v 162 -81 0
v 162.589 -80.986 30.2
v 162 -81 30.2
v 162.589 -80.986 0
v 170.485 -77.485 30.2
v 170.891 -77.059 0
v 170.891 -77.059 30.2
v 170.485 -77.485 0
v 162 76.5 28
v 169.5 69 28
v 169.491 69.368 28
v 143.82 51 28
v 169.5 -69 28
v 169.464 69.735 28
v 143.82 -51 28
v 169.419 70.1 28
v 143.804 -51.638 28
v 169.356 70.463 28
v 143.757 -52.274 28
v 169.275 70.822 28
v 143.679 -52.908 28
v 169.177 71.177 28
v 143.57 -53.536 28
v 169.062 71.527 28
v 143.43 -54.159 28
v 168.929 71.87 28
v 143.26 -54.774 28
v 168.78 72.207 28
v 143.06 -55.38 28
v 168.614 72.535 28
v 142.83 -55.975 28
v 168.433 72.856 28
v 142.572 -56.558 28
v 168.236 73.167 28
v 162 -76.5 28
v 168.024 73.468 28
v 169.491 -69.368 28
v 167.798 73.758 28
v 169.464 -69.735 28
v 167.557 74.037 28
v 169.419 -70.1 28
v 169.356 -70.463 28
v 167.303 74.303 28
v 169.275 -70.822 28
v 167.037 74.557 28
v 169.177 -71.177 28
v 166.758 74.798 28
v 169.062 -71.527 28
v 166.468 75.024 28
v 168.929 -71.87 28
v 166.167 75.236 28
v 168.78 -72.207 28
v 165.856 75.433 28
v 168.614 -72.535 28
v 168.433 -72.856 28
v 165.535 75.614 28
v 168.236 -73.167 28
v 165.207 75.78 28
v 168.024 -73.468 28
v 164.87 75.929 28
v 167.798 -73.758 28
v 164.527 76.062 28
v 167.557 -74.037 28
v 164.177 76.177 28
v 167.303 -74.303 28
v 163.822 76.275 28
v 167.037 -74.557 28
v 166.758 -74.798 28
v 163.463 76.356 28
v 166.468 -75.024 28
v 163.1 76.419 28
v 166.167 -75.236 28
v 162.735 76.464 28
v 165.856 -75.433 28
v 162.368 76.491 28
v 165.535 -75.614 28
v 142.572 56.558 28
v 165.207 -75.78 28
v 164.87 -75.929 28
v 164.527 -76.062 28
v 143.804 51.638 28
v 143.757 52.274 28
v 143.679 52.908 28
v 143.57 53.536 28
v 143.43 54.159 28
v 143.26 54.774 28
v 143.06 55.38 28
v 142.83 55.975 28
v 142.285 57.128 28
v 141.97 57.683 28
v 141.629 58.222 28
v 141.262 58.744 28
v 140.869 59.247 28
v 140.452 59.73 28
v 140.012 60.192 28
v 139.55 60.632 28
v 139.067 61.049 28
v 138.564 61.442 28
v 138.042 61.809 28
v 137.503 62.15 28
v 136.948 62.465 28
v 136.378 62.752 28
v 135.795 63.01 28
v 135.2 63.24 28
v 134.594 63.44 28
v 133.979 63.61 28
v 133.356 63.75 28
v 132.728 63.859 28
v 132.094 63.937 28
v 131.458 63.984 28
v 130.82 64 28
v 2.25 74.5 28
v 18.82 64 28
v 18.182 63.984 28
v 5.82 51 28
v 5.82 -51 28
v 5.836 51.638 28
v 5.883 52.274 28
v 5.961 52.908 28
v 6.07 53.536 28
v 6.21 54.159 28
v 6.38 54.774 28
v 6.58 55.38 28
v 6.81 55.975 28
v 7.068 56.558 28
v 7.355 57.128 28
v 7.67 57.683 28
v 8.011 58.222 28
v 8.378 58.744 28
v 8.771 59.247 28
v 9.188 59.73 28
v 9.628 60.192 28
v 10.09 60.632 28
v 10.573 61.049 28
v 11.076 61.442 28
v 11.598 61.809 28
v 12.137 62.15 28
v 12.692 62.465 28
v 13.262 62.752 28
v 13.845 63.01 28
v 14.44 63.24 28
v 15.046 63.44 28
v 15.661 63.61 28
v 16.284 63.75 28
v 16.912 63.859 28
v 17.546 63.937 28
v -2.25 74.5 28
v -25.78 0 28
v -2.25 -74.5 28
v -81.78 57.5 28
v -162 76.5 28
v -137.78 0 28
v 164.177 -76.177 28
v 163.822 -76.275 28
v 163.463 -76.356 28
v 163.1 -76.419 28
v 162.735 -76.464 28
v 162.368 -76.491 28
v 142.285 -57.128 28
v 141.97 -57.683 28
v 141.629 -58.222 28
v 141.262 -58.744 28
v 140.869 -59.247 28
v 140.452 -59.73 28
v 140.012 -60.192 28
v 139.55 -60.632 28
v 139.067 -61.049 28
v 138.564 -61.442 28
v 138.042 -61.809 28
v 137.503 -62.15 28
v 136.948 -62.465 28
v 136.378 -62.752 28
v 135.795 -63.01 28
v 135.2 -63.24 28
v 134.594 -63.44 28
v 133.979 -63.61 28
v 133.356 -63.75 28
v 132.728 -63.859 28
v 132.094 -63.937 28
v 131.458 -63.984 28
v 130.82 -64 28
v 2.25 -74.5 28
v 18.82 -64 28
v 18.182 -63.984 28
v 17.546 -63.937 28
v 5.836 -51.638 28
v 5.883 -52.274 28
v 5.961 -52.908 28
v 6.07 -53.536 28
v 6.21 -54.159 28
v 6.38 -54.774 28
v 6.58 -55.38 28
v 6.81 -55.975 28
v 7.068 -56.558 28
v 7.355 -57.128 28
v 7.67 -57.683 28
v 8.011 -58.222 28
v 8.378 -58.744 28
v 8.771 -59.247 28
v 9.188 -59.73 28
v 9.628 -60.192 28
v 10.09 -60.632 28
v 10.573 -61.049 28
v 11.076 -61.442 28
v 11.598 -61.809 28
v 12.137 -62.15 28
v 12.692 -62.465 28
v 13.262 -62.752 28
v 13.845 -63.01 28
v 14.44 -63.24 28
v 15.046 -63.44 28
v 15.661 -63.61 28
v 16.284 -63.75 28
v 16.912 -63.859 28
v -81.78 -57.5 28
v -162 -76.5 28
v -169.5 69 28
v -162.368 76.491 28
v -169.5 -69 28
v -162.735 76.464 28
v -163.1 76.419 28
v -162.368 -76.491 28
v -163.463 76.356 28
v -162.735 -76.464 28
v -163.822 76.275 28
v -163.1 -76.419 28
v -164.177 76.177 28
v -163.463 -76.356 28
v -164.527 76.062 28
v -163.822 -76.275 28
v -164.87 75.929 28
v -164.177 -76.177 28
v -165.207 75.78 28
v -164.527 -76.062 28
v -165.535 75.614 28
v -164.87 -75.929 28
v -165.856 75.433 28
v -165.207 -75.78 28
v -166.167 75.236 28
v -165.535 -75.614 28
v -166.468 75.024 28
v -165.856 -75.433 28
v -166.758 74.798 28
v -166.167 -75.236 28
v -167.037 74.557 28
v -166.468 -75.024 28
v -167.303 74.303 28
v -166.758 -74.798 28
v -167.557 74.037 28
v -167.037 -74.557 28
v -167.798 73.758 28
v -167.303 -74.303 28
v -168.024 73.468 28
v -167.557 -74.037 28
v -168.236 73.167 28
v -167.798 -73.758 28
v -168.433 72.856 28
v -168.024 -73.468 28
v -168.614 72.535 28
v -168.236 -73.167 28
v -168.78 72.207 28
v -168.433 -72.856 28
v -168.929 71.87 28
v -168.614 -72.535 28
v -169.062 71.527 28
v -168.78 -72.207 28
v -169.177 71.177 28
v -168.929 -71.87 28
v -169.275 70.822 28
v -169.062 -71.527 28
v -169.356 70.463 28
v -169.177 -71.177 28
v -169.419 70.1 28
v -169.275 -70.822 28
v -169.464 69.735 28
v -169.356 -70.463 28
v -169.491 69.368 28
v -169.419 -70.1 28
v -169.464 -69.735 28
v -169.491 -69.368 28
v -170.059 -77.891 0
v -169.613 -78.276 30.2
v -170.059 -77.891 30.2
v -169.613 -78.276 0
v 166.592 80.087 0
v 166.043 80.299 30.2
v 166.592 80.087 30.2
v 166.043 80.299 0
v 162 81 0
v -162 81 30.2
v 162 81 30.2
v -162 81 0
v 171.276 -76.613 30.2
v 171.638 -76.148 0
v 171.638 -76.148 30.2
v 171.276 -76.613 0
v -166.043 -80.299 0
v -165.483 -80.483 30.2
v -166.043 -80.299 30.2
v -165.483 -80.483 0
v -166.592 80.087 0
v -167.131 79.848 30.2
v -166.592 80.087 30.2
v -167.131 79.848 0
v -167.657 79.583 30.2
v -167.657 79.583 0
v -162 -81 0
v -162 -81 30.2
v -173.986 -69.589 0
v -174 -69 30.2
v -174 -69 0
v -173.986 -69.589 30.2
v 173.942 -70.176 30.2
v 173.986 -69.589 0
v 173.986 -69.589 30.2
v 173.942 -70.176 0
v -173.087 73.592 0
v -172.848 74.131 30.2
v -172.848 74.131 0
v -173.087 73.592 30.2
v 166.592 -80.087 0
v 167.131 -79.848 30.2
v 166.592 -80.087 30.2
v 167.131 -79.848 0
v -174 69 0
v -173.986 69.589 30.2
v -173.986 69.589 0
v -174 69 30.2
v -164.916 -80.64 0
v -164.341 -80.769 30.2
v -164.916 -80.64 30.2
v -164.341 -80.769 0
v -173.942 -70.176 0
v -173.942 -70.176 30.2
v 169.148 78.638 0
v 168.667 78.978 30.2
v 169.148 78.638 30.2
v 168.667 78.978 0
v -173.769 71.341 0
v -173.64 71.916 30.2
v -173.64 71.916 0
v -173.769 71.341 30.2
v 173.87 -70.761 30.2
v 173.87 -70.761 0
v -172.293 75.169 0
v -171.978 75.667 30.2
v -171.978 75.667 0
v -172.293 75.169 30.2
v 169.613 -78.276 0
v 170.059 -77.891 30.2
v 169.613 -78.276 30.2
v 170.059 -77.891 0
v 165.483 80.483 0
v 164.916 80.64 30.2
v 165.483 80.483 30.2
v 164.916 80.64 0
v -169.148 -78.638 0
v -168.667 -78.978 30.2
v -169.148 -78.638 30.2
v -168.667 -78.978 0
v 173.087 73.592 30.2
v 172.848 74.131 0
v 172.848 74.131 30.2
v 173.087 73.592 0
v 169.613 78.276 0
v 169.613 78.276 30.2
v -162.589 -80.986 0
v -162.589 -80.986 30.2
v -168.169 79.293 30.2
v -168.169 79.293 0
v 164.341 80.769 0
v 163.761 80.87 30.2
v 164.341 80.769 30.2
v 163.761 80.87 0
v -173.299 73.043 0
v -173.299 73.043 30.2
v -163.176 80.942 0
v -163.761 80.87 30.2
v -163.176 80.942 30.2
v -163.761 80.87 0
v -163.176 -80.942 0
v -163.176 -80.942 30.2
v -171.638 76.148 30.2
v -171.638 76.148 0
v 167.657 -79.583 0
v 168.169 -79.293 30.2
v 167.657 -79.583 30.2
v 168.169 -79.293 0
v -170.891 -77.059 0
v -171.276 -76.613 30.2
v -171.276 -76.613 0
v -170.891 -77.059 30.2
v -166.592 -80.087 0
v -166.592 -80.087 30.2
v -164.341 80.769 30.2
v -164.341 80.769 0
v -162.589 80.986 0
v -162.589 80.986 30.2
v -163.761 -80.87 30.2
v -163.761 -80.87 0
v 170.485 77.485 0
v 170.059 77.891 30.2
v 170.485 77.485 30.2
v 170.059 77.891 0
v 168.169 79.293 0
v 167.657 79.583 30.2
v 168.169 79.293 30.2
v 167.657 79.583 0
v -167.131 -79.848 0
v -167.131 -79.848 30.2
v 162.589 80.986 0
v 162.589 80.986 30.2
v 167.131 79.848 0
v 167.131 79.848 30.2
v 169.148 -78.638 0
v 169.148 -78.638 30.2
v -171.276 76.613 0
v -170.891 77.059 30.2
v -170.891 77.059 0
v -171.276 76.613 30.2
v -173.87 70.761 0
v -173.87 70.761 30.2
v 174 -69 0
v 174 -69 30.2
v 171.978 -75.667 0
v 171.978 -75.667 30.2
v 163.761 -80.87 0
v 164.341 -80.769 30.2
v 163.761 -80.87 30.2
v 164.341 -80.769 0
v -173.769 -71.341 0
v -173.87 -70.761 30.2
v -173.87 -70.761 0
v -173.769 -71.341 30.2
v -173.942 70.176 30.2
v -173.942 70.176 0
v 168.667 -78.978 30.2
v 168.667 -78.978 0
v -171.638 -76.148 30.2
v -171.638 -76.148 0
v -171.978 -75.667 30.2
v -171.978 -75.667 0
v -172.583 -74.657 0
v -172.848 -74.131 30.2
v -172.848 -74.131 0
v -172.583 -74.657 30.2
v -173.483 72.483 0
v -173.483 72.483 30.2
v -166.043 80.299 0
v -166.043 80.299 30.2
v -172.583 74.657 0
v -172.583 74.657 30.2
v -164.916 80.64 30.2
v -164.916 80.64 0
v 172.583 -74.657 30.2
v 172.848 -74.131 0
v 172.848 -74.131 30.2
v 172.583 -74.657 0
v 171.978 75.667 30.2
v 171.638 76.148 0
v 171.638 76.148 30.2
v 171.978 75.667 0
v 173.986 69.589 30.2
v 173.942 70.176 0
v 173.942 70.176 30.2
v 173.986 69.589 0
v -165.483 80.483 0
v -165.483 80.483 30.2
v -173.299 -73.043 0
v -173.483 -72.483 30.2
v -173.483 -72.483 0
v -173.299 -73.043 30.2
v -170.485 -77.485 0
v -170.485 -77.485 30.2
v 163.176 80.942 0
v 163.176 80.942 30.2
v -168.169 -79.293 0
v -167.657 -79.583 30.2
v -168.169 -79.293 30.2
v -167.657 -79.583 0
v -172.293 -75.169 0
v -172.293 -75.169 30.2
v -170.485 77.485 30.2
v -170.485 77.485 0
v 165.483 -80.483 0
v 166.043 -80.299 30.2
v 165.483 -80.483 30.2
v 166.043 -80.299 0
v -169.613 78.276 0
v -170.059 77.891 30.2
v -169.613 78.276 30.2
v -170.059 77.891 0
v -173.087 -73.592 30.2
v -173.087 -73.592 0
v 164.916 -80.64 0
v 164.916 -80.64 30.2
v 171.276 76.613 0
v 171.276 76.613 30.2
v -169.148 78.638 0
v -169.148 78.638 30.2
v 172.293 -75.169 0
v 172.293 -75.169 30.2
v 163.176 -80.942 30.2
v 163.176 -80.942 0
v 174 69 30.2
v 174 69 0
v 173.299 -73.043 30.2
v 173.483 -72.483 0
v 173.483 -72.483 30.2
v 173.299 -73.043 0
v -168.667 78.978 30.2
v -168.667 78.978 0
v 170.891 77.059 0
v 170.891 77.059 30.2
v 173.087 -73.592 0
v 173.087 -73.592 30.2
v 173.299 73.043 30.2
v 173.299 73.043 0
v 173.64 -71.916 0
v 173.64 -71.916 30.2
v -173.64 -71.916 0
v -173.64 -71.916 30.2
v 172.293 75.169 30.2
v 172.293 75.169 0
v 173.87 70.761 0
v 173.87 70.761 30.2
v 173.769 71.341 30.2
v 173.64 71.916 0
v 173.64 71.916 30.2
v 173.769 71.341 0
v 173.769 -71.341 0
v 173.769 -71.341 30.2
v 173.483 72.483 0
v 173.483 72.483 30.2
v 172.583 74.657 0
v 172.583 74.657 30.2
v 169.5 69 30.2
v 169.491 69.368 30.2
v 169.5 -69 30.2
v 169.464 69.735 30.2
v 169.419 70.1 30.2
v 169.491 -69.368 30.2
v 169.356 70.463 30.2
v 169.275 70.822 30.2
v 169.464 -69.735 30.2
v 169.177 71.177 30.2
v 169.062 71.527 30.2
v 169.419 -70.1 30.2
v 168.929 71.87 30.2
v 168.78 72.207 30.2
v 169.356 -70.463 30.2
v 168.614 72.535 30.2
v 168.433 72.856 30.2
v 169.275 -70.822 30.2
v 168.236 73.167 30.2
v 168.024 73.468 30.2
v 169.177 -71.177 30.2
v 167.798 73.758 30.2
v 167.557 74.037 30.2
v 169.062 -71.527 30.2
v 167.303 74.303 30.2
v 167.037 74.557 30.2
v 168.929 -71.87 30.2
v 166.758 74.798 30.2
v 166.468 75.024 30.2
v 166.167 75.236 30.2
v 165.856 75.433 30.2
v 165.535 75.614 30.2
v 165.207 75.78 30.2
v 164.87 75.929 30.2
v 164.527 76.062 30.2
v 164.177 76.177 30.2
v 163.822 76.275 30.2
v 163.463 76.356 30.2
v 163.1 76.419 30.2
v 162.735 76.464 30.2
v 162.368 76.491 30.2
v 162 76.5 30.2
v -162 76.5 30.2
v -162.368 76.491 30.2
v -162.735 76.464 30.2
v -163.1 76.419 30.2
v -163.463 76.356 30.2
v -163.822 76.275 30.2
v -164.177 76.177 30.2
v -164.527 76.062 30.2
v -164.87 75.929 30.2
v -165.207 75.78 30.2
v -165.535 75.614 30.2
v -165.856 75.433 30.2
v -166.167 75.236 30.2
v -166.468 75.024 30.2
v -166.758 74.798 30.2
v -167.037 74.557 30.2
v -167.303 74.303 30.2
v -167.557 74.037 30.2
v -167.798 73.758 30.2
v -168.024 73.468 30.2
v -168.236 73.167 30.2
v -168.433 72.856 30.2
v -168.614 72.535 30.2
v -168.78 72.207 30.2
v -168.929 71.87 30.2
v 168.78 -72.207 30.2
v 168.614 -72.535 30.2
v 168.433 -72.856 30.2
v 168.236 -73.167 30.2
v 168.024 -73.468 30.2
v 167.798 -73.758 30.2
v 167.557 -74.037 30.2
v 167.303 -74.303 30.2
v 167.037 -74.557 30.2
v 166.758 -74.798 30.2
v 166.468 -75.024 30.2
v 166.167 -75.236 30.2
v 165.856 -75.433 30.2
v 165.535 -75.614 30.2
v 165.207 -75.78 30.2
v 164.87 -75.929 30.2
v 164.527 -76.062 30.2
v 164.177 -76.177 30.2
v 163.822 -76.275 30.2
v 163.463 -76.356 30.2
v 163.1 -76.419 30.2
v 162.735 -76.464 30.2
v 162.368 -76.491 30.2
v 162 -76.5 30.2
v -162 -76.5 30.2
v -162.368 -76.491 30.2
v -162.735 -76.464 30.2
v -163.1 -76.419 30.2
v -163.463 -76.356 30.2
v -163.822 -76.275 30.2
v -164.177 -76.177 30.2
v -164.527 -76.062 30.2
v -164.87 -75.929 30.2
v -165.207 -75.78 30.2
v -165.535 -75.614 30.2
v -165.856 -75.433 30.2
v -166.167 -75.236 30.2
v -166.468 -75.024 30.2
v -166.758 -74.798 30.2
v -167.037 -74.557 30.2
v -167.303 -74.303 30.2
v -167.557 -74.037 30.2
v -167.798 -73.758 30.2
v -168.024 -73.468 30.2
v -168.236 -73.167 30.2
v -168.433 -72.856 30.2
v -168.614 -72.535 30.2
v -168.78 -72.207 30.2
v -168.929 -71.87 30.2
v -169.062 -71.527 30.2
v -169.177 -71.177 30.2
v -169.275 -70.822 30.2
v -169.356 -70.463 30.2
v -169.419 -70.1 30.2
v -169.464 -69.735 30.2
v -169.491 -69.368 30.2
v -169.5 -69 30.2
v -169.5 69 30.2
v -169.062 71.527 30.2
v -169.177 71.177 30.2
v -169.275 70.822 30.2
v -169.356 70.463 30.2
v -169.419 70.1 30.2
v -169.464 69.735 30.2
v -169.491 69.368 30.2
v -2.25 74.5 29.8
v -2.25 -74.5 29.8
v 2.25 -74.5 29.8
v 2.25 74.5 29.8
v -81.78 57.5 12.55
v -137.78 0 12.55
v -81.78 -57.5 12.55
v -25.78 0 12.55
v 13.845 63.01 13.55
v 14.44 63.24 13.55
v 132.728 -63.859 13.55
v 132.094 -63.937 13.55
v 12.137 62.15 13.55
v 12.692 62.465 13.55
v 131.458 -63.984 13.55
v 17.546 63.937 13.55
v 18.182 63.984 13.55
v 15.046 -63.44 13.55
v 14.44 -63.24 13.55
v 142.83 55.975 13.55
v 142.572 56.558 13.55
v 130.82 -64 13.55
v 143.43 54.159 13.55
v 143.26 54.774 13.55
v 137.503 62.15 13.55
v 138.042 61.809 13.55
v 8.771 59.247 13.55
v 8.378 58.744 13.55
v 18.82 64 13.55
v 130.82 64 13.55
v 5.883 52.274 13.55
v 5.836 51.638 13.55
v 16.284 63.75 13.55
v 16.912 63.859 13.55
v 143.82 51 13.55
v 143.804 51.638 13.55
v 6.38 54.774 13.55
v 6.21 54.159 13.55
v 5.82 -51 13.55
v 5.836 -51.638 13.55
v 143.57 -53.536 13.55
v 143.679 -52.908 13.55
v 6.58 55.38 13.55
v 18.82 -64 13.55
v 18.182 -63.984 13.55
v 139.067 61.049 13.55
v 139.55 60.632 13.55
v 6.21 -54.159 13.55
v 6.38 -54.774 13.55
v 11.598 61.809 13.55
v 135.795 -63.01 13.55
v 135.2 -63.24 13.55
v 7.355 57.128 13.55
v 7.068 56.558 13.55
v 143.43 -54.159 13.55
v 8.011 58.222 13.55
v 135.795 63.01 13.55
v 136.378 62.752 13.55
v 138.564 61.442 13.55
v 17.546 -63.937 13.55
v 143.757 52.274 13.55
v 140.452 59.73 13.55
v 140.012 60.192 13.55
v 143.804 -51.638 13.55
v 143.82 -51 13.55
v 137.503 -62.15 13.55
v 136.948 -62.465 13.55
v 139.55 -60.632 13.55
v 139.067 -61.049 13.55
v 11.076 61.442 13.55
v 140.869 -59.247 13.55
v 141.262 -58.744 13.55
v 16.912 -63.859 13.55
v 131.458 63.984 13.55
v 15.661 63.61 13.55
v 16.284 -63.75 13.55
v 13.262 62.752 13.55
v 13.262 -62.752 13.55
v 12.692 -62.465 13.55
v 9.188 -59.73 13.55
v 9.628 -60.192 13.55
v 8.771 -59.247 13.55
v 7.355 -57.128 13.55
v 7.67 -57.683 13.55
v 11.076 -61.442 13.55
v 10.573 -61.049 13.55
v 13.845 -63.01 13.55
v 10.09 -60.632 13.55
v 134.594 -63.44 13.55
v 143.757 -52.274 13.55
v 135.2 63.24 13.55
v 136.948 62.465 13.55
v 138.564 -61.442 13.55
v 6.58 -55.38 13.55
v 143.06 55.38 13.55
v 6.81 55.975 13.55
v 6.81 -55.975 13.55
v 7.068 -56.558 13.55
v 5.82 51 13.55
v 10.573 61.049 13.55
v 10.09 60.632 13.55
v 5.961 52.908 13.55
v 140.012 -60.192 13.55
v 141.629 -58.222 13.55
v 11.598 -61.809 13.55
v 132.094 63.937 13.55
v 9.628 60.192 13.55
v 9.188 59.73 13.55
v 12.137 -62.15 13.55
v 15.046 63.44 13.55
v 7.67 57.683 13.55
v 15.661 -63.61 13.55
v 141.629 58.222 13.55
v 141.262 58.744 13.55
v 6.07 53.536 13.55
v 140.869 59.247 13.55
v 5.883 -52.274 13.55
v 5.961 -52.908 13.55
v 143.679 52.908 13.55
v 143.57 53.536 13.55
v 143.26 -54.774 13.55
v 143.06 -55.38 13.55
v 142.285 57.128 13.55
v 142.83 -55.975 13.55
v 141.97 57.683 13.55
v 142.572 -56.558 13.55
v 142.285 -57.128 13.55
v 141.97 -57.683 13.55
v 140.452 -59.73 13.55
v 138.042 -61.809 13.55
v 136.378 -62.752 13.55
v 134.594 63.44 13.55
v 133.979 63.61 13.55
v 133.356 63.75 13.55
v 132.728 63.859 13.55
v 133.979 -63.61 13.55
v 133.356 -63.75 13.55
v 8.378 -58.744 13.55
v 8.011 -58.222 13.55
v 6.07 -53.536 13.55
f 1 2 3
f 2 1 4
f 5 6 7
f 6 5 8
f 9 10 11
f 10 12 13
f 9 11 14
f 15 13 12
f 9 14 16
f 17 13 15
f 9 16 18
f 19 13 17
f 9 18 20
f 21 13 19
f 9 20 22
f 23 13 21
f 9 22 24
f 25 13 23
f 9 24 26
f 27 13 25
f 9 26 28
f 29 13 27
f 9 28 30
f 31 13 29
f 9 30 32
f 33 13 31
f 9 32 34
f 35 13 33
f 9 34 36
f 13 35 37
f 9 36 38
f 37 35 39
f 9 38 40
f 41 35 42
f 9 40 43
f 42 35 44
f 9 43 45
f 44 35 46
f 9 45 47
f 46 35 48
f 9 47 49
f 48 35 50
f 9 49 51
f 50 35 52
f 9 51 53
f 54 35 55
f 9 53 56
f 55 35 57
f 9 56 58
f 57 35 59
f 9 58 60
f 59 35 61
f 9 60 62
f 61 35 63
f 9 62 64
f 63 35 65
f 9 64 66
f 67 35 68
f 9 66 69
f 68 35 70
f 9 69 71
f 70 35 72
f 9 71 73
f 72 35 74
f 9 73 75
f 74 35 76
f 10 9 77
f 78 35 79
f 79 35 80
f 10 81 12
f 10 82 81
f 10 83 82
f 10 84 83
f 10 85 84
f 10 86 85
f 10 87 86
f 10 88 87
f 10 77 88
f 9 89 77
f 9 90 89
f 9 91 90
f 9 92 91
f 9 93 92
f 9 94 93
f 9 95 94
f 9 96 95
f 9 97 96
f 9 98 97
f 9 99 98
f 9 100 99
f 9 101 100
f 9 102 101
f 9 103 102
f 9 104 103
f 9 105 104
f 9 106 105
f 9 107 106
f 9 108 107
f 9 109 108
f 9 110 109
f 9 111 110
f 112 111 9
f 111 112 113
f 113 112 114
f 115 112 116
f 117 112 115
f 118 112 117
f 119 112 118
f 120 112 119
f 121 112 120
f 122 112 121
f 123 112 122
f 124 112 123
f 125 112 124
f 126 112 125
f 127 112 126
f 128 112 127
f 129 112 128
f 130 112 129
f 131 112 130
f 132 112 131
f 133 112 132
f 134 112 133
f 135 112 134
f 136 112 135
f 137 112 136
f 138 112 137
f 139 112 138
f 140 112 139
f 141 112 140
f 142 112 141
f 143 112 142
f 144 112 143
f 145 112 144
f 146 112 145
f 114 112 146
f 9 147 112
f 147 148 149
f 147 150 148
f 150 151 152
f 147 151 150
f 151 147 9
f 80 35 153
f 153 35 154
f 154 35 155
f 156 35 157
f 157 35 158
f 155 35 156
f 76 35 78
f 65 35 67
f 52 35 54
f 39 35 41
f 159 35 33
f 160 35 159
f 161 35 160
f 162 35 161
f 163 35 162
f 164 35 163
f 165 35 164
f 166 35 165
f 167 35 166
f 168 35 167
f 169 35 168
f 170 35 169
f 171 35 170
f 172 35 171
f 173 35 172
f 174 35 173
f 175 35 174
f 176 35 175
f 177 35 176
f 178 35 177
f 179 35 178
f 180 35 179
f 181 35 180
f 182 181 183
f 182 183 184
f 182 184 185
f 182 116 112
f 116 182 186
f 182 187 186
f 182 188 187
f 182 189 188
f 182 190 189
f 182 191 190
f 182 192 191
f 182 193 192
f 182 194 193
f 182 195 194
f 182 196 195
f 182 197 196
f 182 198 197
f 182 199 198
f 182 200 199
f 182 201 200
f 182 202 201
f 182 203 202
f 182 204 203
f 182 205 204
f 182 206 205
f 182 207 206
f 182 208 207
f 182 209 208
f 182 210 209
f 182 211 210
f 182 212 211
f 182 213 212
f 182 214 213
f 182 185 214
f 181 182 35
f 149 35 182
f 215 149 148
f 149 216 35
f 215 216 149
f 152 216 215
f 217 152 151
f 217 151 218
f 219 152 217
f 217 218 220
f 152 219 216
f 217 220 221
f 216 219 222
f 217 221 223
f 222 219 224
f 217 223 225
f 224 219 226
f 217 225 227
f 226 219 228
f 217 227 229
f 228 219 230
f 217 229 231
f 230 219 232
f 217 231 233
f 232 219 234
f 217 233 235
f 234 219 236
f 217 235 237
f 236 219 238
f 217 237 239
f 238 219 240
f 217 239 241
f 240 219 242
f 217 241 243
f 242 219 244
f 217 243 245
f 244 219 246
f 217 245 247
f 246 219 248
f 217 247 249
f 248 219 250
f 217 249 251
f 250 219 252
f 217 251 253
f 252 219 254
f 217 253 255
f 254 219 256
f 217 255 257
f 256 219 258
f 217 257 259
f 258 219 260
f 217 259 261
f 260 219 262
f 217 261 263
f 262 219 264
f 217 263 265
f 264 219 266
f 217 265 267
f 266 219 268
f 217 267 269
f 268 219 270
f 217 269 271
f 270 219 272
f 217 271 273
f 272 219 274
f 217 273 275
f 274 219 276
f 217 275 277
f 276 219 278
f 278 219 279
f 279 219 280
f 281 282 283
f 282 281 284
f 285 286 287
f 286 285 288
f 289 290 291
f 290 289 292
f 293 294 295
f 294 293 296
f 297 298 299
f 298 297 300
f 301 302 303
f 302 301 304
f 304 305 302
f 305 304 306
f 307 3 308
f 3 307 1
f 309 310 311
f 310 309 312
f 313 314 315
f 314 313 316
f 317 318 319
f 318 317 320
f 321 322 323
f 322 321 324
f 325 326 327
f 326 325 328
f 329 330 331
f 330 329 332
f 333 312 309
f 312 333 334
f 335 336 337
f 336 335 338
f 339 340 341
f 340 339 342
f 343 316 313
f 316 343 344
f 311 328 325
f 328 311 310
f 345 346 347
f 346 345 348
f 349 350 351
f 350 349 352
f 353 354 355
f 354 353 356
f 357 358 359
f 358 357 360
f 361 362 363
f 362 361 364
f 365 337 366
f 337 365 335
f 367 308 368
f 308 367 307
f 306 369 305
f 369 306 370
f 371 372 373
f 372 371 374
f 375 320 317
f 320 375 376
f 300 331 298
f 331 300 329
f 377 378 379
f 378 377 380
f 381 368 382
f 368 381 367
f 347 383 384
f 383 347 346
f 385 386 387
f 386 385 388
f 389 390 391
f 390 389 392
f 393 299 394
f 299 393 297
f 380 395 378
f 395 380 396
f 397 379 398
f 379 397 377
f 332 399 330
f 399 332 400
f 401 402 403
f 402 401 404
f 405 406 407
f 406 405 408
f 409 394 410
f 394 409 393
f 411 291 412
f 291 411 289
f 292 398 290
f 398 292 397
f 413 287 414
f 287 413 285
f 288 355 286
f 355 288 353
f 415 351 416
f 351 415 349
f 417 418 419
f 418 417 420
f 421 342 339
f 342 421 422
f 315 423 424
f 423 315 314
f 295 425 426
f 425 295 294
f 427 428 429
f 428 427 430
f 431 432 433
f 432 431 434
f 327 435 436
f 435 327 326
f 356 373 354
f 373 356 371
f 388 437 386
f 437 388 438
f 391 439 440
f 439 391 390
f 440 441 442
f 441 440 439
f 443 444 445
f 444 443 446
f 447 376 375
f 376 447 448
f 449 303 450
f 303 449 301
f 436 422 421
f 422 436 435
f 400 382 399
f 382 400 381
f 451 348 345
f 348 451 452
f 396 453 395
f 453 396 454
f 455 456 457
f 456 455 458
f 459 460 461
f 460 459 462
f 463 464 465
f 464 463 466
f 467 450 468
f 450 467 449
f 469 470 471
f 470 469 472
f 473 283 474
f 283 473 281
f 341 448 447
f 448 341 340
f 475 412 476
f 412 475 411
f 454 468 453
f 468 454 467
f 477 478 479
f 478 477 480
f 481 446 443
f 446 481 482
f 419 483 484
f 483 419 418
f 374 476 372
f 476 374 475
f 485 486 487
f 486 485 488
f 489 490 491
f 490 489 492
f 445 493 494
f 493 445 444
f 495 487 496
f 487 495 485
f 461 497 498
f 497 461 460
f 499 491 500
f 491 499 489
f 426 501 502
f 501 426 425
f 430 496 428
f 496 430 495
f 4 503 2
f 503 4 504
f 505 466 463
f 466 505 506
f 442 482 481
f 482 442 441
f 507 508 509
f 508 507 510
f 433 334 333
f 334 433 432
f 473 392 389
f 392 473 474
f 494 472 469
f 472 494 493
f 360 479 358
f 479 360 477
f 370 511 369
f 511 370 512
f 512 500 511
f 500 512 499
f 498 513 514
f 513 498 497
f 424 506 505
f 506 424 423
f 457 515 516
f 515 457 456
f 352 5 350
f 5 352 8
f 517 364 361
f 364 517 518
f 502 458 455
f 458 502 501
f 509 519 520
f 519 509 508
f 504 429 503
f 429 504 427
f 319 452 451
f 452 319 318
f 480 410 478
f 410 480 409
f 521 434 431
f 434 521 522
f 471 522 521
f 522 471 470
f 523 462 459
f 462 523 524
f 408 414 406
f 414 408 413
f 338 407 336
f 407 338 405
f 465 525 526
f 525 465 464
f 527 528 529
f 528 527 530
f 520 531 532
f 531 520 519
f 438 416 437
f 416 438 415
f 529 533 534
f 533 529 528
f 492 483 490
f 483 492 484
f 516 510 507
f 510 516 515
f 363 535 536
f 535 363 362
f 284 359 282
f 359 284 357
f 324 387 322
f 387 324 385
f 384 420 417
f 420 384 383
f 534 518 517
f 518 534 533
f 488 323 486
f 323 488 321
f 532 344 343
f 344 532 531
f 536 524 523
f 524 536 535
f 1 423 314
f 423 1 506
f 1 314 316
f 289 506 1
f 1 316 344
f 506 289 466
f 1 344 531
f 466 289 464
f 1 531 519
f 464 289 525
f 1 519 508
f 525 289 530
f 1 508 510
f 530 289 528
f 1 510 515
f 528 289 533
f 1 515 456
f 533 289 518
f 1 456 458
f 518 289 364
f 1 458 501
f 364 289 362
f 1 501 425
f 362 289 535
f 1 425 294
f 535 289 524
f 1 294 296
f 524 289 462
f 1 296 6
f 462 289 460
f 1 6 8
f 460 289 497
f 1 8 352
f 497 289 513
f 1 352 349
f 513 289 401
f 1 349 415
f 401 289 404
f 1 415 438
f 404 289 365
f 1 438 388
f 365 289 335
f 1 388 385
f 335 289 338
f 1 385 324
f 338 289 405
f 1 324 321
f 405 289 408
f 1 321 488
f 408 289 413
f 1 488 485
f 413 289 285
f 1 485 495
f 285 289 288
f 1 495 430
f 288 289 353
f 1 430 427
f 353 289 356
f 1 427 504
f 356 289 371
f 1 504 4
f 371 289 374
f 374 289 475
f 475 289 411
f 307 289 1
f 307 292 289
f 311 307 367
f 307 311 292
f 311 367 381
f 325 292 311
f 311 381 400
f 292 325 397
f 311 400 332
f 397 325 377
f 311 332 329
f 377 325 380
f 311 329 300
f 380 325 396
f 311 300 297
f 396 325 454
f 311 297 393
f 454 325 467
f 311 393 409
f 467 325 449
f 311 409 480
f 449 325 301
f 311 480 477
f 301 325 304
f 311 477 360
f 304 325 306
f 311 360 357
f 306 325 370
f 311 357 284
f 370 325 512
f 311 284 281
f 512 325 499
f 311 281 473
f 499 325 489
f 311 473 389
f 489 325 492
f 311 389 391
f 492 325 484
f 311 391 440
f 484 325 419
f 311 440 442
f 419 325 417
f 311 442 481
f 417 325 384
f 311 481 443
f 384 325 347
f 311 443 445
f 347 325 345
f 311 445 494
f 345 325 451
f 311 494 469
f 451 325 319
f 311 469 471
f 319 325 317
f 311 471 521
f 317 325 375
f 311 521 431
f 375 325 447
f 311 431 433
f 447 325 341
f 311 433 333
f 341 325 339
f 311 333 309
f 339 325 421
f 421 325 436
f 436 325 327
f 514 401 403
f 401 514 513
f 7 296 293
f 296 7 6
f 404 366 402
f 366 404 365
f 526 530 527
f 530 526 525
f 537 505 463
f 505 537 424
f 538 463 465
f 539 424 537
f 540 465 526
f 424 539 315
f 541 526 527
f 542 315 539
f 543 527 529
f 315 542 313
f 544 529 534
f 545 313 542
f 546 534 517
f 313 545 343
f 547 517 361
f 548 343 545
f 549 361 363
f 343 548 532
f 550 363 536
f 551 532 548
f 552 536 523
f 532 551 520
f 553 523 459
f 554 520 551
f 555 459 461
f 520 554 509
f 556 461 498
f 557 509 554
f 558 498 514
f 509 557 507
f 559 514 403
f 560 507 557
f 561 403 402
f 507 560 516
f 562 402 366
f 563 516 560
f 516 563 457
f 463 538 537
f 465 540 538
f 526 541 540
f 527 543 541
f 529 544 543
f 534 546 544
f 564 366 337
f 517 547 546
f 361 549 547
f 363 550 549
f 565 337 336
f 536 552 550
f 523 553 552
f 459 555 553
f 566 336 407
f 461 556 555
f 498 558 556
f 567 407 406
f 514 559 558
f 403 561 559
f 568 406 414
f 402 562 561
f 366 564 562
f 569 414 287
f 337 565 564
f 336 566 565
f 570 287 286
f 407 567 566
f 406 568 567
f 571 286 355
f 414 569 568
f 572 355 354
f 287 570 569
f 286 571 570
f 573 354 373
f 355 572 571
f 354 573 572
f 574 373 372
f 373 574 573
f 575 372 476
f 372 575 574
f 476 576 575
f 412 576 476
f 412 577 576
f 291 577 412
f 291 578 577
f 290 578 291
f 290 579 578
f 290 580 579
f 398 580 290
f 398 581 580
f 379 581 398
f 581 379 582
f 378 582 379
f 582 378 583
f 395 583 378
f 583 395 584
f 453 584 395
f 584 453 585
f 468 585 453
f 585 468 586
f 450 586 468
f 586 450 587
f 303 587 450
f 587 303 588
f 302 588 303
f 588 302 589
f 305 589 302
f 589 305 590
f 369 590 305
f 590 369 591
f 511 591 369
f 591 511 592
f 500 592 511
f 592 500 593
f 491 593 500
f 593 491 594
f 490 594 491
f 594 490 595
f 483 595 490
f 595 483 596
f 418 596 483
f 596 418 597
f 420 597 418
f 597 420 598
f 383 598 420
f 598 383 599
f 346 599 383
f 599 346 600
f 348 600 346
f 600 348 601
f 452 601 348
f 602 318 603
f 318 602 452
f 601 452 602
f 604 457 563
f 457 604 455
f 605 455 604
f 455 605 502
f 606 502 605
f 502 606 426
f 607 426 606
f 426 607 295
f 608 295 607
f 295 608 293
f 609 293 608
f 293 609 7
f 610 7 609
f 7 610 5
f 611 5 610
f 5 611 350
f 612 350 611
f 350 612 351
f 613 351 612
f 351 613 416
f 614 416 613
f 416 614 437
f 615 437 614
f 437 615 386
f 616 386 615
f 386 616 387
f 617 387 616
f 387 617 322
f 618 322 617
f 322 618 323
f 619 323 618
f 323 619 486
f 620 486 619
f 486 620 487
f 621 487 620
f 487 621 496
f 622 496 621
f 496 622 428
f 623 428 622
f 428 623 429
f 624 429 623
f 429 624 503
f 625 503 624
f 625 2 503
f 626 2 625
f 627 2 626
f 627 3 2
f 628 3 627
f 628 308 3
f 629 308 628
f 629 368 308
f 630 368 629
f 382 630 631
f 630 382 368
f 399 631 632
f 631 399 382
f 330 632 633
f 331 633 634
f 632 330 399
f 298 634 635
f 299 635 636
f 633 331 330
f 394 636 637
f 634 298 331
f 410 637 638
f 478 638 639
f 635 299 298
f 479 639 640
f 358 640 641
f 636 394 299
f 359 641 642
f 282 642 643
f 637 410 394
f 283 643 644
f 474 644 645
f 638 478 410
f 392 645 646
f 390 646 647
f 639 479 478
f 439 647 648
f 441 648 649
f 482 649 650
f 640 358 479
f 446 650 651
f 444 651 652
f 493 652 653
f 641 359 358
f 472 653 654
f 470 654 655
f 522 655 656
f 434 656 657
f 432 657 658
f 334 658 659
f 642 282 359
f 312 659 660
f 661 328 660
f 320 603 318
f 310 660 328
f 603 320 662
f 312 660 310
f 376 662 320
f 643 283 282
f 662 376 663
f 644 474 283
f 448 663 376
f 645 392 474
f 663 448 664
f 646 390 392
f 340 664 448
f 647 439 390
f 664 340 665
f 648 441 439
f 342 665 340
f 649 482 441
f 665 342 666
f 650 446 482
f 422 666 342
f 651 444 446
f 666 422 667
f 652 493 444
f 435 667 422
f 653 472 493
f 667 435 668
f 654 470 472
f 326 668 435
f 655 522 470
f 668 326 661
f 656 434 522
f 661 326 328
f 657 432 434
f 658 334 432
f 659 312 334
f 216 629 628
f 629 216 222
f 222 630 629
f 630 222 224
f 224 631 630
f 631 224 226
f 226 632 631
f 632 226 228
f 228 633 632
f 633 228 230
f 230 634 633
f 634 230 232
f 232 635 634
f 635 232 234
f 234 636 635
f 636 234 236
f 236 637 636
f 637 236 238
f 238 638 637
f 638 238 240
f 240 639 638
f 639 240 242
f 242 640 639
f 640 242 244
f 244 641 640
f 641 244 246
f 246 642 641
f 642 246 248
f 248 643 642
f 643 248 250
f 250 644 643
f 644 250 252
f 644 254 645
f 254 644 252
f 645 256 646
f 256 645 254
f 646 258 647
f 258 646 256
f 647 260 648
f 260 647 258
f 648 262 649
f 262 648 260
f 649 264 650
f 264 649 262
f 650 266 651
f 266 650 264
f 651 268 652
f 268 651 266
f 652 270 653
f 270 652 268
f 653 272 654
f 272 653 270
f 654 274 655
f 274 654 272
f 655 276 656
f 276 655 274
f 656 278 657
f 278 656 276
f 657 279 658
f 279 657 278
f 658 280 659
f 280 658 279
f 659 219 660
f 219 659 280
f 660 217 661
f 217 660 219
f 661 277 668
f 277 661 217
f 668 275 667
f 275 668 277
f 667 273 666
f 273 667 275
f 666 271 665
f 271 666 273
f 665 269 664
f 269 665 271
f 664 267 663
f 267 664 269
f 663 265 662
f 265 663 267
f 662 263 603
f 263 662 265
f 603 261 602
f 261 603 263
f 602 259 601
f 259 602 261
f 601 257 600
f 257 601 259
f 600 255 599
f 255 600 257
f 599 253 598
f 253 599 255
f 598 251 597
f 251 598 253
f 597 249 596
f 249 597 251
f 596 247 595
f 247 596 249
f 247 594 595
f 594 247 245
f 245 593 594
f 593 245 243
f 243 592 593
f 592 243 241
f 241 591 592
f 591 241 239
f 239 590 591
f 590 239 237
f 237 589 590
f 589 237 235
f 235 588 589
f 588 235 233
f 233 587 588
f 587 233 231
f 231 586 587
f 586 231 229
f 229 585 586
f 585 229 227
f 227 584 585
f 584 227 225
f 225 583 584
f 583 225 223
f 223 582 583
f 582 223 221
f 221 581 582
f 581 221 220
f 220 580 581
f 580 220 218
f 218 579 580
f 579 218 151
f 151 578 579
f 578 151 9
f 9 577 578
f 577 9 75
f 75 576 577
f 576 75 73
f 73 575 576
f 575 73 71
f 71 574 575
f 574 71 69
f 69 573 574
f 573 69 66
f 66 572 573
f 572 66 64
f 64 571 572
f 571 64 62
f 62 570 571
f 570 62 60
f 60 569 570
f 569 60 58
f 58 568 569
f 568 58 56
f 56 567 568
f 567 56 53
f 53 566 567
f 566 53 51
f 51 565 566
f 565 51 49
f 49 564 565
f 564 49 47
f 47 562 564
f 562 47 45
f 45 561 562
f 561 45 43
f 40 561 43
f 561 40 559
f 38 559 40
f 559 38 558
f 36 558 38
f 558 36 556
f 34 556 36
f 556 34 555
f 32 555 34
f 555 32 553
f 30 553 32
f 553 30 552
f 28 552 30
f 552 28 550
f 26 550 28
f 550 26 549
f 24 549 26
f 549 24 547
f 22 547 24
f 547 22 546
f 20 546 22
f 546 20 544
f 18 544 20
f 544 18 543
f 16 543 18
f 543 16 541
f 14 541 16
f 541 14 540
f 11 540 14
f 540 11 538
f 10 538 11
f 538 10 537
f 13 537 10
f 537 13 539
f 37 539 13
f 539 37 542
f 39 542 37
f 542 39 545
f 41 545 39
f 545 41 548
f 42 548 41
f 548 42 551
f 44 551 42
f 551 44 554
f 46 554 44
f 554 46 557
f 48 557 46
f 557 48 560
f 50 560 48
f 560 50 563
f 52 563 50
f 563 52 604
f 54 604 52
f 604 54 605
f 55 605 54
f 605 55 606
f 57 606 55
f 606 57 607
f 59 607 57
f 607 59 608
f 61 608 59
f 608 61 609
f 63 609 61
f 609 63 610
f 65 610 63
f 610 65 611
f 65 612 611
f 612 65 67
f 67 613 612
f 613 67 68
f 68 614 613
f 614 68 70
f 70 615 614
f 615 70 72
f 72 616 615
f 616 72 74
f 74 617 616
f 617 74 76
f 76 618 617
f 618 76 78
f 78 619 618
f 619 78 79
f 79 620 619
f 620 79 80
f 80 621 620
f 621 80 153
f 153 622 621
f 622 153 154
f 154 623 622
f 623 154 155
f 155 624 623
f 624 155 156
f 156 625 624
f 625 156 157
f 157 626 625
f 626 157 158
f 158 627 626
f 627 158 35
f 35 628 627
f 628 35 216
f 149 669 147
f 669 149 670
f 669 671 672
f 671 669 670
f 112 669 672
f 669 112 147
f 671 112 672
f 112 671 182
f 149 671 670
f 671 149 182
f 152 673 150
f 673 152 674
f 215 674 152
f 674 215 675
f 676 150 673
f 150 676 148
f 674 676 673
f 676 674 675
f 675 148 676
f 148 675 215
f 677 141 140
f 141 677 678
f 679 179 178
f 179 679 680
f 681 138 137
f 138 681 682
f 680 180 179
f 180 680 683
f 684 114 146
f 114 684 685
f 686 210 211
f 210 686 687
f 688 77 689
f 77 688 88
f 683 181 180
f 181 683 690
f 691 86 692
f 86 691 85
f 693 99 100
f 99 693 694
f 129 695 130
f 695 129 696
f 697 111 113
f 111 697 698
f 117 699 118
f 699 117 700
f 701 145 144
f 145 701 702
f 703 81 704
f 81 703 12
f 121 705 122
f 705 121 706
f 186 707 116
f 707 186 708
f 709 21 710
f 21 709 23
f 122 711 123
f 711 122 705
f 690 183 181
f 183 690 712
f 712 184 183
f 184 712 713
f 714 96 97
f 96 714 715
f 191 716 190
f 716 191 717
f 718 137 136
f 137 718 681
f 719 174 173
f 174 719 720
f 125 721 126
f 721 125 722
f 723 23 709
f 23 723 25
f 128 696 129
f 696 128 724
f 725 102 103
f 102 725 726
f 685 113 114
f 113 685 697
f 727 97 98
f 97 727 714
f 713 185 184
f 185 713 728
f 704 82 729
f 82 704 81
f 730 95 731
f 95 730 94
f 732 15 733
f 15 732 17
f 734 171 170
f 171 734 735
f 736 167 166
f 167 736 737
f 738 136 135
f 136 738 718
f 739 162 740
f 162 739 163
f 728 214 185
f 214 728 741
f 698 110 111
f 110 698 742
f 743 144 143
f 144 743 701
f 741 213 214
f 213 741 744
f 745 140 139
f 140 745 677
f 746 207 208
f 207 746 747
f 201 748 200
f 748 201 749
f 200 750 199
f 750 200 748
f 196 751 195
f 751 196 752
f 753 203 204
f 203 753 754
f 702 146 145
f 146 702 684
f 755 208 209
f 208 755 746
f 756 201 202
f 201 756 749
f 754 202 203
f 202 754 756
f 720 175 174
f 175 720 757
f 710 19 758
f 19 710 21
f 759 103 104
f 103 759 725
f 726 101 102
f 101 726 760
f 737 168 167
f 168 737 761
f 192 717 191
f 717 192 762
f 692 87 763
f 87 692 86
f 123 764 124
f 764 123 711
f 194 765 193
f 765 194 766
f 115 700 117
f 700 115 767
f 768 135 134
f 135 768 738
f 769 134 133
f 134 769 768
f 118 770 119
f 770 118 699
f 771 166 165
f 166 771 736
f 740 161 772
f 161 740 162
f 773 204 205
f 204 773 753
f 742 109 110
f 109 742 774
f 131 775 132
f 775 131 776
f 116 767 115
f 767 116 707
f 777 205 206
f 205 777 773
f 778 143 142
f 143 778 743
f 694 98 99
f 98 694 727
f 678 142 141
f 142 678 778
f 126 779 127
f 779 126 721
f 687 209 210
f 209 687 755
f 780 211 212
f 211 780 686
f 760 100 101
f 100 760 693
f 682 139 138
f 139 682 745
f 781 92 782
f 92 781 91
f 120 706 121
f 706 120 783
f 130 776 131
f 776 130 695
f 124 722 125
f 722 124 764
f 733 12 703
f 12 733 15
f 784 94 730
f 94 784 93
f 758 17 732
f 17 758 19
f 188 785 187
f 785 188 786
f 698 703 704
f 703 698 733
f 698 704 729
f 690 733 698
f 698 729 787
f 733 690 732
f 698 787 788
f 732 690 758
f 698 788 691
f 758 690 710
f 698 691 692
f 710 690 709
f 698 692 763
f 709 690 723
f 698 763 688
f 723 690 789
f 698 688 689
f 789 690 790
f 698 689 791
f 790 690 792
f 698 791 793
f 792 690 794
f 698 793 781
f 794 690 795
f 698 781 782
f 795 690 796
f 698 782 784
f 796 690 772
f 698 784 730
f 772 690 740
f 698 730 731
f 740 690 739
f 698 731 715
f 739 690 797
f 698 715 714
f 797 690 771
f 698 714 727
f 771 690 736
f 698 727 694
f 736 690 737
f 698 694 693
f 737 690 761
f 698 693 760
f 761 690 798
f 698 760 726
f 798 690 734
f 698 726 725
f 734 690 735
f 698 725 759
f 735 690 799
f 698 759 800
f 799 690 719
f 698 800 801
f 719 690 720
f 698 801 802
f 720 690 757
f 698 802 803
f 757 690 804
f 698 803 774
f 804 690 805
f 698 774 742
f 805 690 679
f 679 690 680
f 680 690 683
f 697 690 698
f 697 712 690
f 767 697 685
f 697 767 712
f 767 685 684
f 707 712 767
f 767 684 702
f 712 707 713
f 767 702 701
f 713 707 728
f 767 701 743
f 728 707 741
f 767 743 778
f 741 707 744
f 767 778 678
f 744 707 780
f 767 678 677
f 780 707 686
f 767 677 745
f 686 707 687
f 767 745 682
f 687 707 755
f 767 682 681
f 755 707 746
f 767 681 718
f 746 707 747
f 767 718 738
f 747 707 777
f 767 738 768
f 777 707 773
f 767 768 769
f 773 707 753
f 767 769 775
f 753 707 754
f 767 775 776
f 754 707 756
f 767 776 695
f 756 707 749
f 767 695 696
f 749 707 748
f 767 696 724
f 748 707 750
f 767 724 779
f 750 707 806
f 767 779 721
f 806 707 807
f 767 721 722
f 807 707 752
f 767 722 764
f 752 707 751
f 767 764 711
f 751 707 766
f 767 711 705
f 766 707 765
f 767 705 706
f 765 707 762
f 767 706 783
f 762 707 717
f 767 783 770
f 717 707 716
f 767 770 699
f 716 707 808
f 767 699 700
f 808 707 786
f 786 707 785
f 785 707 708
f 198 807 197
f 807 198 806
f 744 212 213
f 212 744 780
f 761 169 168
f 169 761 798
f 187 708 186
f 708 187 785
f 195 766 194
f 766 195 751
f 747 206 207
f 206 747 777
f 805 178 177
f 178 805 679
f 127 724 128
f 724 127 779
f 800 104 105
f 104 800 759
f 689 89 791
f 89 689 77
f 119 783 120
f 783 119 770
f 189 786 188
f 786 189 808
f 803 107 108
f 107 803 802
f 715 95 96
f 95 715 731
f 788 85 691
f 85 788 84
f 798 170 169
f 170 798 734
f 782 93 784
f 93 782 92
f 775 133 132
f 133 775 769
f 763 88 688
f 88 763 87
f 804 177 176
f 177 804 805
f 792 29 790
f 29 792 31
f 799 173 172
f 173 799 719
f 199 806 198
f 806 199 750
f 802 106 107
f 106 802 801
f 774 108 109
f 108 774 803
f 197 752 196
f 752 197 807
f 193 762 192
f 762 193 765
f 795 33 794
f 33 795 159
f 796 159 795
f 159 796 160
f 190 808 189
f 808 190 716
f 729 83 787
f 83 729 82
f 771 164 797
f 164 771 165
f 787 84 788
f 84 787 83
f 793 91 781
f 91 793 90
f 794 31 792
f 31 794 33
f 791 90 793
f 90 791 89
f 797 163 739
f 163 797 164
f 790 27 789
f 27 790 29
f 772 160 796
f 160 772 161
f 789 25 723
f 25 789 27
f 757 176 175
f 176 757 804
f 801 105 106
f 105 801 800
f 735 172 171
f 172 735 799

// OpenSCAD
// ====================================================================
// SOUL IDENTIFICATION RUNE (SIR) - BASE SLAB GENERATOR
// Aurphyx Primordial Standards (APS) - Parametric Specification V3
// Document: APS-SIR-SLAB-01 | Companion to APS-SIR-BOM-2026-V3
// Author: Audry (Aurphyx) | 2026-08-06
// ====================================================================
//
// DESIGN INTENT
// -------------
// Single large-format "ancient tablet" prototype.
// Blank monolithic stone slab with two precision pockets:
//   Left  : Diamond (Birthstone Chamber)
//   Right : Rounded Rectangle (SKIM / SoulKey Identification Mandala Chamber)
// Raised outer border + central vertical divider.
// Material target: Imperial Black / Dark Forest Nephrite Jade
//                  (or Absolute Black Gabbro / Spectrolite Labradorite)
//
// SCALE: Macro tablet intended to later showcase nano-scale SKIM technology.
// UNITS: All dimensions in millimeters (professional standard).
// ====================================================================

/* [Rune Dimensions (mm)] */
rune_width      = 348;     // Target ~13.70 in
rune_height     = 162;     // Target ~6.38 in
rune_thickness  = 28;      // Target ~1.10 in

/* [Inlay Pocket Depths (mm)] */
birthstone_depth = 15.5;   // Deep enough for substantial birthstone + seating
skim_depth       = 14.5;   // Fluidic / quartz cell depth

/* [Pocket Footprints (mm) — proportionally scaled from Canva visual balance] */
diamond_w   = 112;
diamond_h   = 115;
skim_w      = 138;
skim_h      = 128;

/* [Styling & Border (mm)] */
corner_radius   = 12.0;    // Outer corner radius
border_width    = 4.5;     // Raised outer trim width
border_height   = 2.2;     // Raised outer trim height above Face A
central_bar_w   = 4.5;     // Central vertical divider width
central_bar_h   = 1.8;     // Slightly lower than outer border for hierarchy

/* [Rendering] */
$fn = 128;                 // High smoothness for large curved features

// --- MAIN ASSEMBLY ---
module SIR_Rune() {
    difference() {
        union() {
            // Base Stone Body
            rounded_slab(rune_width, rune_height, rune_thickness, corner_radius);
           
            // Raised Outer Border Trim
            translate([0, 0, rune_thickness])
                border_trim(rune_width, rune_height, corner_radius, border_width, border_height);
            
            // Central Vertical Divider
            translate([0, 0, rune_thickness])
                central_divider(rune_height, corner_radius, central_bar_w, central_bar_h, border_width);
        }
       
        // 1. Birthstone Diamond Pocket (Left)
        // Positioned to maintain healthy webs to outer border and central divider
        translate([-rune_width * 0.235, 0, rune_thickness - birthstone_depth + 0.05])
            diamond_pocket(diamond_w, diamond_h, birthstone_depth + border_height + 2);
           
        // 2. SKIM Chamber Pocket (Right)
        translate([rune_width * 0.215, 0, rune_thickness - skim_depth + 0.05])
            skim_chamber(skim_w, skim_h, skim_depth + border_height + 2, 13);
    }
}

// --- HELPER MODULES ---

// Rounded Rectangular Slab
module rounded_slab(width, height, thickness, radius) {
    linear_extrude(height = thickness) {
        offset(r = radius) {
            square([width - 2*radius, height - 2*radius], center = true);
        }
    }
}

// Raised Outer Trim (hollow frame)
module border_trim(width, height, radius, width_trim, height_trim) {
    linear_extrude(height = height_trim) {
        difference() {
            offset(r = radius)
                square([width - 2*radius, height - 2*radius], center = true);
            offset(r = radius - width_trim)
                square([width - 2*radius, height - 2*radius], center = true);
        }
    }
}

// Central Vertical Divider Bar
module central_divider(height, radius, bar_w, bar_h, outer_border_w) {
    linear_extrude(height = bar_h) {
        square([bar_w, height - 2*outer_border_w - 4], center = true);
    }
}

// Diamond-Shaped Cavity for Birthstone (rhombus)
module diamond_pocket(dia_w, dia_h, depth) {
    linear_extrude(height = depth) {
        polygon(points = [
            [0,        dia_h/2],
            [dia_w/2,  0],
            [0,       -dia_h/2],
            [-dia_w/2, 0]
        ]);
    }
}

// SKIM Fluid / Quartz Chamber (Rounded Rectangle)
module skim_chamber(ch_w, ch_h, depth, corner_r) {
    linear_extrude(height = depth) {
        offset(r = corner_r) {
            square([ch_w - 2*corner_r, ch_h - 2*corner_r], center = true);
        }
    }
}

// --- RENDER ---
SIR_Rune();

// ====================================================================
// USAGE NOTES
// ====================================================================
// 1. Open in OpenSCAD or compatible CAD environment.
// 2. All parameters are in millimeters.
// 3. Export as STL / 3MF for CNC toolpath generation.
// 4. For production stone work: use diamond tooling, water or ultrasonic
//    coolant, and conservative feeds on Nephrite / Absolute Black.
// 5. This is a single prototype blank. Visual fidelity and dimensional
//    accuracy take priority over speed.
// 6. Minimum wall / web integrity is the fabricator's responsibility
//    (see BOM structural notes).
// ====================================================================
